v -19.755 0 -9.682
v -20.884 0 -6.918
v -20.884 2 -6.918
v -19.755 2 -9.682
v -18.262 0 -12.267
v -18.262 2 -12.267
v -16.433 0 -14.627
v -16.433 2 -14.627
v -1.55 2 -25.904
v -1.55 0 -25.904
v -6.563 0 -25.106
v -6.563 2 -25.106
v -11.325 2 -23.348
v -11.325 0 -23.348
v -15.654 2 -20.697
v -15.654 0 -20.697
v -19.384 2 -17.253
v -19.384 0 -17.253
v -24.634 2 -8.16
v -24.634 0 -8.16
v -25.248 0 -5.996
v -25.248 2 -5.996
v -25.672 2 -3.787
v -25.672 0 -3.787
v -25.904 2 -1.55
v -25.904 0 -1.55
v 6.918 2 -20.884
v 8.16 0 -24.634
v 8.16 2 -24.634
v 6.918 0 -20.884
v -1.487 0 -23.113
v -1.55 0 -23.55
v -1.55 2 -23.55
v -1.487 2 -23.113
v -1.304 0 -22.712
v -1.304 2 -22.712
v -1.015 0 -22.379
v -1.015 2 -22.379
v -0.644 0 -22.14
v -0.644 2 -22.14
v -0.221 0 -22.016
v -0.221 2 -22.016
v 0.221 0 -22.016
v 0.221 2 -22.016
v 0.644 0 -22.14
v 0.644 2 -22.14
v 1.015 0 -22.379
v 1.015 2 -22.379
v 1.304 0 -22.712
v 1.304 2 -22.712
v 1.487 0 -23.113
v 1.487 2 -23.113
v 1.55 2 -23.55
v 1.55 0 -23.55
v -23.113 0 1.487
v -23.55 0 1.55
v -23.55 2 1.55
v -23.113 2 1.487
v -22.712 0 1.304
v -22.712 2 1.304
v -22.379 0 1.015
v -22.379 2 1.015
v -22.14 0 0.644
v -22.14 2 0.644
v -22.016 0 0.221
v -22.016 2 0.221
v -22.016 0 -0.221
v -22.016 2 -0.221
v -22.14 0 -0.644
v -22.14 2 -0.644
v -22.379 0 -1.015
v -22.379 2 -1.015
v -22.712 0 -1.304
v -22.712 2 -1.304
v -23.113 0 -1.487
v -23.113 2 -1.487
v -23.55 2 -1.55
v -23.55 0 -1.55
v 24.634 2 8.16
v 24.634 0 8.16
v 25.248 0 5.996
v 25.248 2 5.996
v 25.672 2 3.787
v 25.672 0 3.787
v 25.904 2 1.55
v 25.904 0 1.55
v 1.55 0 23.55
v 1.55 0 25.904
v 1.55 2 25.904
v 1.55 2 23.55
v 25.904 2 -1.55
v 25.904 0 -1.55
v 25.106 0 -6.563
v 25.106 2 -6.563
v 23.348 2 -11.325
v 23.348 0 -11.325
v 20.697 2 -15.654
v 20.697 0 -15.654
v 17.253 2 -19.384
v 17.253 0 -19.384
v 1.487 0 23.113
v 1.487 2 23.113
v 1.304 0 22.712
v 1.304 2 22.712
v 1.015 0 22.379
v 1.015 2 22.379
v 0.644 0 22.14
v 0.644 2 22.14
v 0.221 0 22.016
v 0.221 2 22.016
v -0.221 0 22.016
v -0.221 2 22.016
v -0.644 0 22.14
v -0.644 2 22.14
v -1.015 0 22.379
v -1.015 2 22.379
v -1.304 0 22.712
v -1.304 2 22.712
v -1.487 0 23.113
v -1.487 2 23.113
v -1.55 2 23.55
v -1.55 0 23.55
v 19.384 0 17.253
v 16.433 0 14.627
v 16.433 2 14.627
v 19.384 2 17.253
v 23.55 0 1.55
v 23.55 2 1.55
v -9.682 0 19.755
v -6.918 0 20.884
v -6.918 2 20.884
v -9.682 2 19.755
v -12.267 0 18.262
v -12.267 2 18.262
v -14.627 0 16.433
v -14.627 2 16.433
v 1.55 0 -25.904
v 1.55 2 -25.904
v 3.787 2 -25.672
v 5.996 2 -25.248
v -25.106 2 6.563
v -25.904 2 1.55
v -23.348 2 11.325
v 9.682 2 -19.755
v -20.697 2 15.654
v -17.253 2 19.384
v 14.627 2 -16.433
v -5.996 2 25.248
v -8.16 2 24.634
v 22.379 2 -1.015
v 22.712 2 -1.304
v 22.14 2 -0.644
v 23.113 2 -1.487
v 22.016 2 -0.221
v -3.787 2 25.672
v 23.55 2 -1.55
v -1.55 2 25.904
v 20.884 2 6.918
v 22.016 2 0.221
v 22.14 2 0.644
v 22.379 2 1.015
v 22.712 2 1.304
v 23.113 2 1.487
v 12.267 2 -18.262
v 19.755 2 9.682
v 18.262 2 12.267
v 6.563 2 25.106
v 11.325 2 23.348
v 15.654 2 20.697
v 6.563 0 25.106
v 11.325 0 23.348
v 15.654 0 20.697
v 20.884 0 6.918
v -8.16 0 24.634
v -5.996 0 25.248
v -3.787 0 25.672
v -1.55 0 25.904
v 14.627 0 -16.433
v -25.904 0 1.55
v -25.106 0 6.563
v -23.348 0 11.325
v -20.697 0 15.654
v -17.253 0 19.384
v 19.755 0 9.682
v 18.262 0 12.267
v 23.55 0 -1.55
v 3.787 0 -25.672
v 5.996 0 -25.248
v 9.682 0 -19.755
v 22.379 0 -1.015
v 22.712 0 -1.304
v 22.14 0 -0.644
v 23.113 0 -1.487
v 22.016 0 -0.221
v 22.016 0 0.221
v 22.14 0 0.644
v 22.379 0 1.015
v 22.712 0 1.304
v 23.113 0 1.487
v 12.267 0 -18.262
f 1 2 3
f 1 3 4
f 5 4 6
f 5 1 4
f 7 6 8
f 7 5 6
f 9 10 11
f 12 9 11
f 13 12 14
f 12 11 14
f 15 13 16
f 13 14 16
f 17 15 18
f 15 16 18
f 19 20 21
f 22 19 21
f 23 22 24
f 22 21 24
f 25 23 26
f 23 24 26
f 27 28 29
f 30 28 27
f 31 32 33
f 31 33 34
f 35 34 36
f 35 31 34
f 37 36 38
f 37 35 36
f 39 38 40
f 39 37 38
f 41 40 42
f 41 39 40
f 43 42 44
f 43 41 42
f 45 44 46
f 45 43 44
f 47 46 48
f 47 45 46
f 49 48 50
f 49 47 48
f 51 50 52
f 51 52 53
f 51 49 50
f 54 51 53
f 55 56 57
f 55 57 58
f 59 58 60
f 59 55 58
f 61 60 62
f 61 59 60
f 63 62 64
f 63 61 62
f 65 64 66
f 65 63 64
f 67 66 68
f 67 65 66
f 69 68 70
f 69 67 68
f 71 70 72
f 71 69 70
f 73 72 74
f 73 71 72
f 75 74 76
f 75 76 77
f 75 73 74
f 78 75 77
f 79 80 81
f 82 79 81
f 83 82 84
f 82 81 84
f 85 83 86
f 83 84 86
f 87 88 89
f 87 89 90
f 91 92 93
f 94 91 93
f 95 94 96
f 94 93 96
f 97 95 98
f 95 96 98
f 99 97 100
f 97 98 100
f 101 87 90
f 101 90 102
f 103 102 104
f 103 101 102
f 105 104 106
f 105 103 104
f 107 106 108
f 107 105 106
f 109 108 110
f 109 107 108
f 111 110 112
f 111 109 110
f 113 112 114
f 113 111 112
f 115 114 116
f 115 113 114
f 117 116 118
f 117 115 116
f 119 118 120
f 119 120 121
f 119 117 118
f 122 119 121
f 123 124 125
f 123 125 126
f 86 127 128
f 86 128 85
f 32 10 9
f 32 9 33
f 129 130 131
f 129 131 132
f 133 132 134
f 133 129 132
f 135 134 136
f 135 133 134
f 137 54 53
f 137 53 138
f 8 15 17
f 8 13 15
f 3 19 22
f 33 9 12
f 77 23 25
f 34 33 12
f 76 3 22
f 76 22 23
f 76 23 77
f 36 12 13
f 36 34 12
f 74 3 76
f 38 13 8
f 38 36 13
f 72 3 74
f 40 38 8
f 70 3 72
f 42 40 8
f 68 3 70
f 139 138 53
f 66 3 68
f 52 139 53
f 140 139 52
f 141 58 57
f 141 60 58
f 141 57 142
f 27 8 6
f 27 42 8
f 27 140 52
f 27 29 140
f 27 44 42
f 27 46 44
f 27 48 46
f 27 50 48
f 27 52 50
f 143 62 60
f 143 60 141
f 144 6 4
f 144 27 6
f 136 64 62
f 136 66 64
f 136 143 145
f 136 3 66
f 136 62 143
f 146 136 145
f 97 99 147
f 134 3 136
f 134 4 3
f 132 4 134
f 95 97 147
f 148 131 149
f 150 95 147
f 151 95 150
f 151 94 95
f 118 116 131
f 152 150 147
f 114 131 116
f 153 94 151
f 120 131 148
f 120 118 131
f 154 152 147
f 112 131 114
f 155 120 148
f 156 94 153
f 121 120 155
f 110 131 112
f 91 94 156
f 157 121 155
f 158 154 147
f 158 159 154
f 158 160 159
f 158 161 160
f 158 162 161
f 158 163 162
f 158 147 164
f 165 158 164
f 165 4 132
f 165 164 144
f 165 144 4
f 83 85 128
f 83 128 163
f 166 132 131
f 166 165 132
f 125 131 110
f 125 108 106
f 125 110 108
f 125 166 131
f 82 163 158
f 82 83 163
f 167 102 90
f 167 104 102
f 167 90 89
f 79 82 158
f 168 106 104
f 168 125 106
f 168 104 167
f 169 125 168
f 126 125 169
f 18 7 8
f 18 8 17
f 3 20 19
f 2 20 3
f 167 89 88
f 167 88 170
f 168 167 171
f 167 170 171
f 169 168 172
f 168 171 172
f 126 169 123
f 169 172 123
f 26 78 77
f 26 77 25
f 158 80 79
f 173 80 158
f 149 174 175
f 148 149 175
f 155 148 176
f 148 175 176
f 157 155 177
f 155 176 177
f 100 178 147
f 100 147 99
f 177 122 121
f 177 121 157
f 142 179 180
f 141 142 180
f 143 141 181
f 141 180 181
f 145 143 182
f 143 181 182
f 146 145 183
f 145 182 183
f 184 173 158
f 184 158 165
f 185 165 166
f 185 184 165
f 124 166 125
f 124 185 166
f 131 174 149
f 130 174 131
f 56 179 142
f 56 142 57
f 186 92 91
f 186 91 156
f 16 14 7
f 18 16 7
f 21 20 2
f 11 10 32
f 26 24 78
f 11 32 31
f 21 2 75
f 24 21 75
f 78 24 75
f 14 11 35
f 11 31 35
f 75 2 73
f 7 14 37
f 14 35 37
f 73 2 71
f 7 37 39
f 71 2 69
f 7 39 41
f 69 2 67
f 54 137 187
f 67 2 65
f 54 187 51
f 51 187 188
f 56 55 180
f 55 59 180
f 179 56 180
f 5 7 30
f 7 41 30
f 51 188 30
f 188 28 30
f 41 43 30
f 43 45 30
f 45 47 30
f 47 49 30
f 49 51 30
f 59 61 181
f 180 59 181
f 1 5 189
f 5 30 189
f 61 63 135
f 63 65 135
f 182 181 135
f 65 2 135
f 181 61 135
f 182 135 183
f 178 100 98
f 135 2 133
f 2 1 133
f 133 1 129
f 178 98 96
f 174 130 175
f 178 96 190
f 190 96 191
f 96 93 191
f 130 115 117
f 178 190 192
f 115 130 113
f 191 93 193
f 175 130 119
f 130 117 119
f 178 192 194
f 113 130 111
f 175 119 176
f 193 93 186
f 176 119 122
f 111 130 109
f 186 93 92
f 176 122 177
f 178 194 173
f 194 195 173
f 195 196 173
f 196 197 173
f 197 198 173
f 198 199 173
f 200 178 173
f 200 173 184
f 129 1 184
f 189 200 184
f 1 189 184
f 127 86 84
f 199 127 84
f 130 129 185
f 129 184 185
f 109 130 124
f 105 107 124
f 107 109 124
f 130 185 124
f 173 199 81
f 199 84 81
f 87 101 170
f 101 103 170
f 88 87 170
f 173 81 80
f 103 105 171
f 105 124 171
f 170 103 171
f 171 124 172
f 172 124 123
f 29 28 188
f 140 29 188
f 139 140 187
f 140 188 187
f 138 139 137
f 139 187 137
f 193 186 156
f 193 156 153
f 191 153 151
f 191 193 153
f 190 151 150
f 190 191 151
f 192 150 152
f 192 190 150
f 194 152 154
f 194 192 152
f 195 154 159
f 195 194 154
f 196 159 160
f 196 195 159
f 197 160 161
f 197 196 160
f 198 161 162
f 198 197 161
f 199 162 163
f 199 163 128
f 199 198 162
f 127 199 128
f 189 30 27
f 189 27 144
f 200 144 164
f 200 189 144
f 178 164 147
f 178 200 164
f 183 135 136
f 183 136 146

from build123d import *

# Parameters (mm, degrees)
ESQUISSE1_R                  = 25.95
BOSS_EXTRU_1_DEPTH           = 2
ENL_V_MAT_EXTRU_8_DEPTH      = 2
R_P_TITION_CIRCULAIRE1_COUNT = 4


with BuildPart() as part:
    # Esquisse1 → Boss.-Extru.1 (new body)
    with BuildSketch(Plane(origin=(0, 0, 0), x_dir=(1, 0, 0), z_dir=(0, 1, 0))):
        with Locations(Location((0, 0, 0), (0, 0, 270))):  # turned: the seam where the file's is
            Circle(ESQUISSE1_R)
    extrude(amount=BOSS_EXTRU_1_DEPTH)

    # Esquisse2 → Enlèv. mat.-Extru.8 (cut)
    with BuildSketch(Plane(origin=(0, 0, 0), x_dir=(1, 0, 0), z_dir=(0, 1, 0))):
        with BuildLine():
            Line((-1.55, 25.903667694), (-1.55, 23.55))
            ThreePointArc((-1.55, 23.55), (0, 22), (1.55, 23.55))
            Line((1.55, 23.55), (1.55, 25.903667694))
            ThreePointArc((1.55, 25.903667694), (0, 25.95), (-1.55, 25.903667694))
        make_face()
        with BuildLine():
            Line((8.160057781, 24.633634669), (6.917968061, 20.884006271))
            ThreePointArc((6.917968061, 20.884006271), (11, 19.052558883), (14.627095933, 16.433139219))
            Line((14.627095933, 16.433139219), (17.253324521, 19.383634669))
            ThreePointArc((17.253324521, 19.383634669), (12.975, 22.473359228), (8.160057781, 24.633634669))
        make_face()
    enl_v_mat_extru_8 = extrude(amount=ENL_V_MAT_EXTRU_8_DEPTH, mode=Mode.SUBTRACT)

    # Répétition circulaire1: Enlèv. mat.-Extru.8 ×4 about axis
    r_p_tition_circulaire1_axis = Axis((0, 0, 0), (0, 1, 0))
    for i in range(1, R_P_TITION_CIRCULAIRE1_COUNT):
        add(enl_v_mat_extru_8.rotate(r_p_tition_circulaire1_axis, i * 360 / R_P_TITION_CIRCULAIRE1_COUNT), mode=Mode.SUBTRACT)


solid = part.part
